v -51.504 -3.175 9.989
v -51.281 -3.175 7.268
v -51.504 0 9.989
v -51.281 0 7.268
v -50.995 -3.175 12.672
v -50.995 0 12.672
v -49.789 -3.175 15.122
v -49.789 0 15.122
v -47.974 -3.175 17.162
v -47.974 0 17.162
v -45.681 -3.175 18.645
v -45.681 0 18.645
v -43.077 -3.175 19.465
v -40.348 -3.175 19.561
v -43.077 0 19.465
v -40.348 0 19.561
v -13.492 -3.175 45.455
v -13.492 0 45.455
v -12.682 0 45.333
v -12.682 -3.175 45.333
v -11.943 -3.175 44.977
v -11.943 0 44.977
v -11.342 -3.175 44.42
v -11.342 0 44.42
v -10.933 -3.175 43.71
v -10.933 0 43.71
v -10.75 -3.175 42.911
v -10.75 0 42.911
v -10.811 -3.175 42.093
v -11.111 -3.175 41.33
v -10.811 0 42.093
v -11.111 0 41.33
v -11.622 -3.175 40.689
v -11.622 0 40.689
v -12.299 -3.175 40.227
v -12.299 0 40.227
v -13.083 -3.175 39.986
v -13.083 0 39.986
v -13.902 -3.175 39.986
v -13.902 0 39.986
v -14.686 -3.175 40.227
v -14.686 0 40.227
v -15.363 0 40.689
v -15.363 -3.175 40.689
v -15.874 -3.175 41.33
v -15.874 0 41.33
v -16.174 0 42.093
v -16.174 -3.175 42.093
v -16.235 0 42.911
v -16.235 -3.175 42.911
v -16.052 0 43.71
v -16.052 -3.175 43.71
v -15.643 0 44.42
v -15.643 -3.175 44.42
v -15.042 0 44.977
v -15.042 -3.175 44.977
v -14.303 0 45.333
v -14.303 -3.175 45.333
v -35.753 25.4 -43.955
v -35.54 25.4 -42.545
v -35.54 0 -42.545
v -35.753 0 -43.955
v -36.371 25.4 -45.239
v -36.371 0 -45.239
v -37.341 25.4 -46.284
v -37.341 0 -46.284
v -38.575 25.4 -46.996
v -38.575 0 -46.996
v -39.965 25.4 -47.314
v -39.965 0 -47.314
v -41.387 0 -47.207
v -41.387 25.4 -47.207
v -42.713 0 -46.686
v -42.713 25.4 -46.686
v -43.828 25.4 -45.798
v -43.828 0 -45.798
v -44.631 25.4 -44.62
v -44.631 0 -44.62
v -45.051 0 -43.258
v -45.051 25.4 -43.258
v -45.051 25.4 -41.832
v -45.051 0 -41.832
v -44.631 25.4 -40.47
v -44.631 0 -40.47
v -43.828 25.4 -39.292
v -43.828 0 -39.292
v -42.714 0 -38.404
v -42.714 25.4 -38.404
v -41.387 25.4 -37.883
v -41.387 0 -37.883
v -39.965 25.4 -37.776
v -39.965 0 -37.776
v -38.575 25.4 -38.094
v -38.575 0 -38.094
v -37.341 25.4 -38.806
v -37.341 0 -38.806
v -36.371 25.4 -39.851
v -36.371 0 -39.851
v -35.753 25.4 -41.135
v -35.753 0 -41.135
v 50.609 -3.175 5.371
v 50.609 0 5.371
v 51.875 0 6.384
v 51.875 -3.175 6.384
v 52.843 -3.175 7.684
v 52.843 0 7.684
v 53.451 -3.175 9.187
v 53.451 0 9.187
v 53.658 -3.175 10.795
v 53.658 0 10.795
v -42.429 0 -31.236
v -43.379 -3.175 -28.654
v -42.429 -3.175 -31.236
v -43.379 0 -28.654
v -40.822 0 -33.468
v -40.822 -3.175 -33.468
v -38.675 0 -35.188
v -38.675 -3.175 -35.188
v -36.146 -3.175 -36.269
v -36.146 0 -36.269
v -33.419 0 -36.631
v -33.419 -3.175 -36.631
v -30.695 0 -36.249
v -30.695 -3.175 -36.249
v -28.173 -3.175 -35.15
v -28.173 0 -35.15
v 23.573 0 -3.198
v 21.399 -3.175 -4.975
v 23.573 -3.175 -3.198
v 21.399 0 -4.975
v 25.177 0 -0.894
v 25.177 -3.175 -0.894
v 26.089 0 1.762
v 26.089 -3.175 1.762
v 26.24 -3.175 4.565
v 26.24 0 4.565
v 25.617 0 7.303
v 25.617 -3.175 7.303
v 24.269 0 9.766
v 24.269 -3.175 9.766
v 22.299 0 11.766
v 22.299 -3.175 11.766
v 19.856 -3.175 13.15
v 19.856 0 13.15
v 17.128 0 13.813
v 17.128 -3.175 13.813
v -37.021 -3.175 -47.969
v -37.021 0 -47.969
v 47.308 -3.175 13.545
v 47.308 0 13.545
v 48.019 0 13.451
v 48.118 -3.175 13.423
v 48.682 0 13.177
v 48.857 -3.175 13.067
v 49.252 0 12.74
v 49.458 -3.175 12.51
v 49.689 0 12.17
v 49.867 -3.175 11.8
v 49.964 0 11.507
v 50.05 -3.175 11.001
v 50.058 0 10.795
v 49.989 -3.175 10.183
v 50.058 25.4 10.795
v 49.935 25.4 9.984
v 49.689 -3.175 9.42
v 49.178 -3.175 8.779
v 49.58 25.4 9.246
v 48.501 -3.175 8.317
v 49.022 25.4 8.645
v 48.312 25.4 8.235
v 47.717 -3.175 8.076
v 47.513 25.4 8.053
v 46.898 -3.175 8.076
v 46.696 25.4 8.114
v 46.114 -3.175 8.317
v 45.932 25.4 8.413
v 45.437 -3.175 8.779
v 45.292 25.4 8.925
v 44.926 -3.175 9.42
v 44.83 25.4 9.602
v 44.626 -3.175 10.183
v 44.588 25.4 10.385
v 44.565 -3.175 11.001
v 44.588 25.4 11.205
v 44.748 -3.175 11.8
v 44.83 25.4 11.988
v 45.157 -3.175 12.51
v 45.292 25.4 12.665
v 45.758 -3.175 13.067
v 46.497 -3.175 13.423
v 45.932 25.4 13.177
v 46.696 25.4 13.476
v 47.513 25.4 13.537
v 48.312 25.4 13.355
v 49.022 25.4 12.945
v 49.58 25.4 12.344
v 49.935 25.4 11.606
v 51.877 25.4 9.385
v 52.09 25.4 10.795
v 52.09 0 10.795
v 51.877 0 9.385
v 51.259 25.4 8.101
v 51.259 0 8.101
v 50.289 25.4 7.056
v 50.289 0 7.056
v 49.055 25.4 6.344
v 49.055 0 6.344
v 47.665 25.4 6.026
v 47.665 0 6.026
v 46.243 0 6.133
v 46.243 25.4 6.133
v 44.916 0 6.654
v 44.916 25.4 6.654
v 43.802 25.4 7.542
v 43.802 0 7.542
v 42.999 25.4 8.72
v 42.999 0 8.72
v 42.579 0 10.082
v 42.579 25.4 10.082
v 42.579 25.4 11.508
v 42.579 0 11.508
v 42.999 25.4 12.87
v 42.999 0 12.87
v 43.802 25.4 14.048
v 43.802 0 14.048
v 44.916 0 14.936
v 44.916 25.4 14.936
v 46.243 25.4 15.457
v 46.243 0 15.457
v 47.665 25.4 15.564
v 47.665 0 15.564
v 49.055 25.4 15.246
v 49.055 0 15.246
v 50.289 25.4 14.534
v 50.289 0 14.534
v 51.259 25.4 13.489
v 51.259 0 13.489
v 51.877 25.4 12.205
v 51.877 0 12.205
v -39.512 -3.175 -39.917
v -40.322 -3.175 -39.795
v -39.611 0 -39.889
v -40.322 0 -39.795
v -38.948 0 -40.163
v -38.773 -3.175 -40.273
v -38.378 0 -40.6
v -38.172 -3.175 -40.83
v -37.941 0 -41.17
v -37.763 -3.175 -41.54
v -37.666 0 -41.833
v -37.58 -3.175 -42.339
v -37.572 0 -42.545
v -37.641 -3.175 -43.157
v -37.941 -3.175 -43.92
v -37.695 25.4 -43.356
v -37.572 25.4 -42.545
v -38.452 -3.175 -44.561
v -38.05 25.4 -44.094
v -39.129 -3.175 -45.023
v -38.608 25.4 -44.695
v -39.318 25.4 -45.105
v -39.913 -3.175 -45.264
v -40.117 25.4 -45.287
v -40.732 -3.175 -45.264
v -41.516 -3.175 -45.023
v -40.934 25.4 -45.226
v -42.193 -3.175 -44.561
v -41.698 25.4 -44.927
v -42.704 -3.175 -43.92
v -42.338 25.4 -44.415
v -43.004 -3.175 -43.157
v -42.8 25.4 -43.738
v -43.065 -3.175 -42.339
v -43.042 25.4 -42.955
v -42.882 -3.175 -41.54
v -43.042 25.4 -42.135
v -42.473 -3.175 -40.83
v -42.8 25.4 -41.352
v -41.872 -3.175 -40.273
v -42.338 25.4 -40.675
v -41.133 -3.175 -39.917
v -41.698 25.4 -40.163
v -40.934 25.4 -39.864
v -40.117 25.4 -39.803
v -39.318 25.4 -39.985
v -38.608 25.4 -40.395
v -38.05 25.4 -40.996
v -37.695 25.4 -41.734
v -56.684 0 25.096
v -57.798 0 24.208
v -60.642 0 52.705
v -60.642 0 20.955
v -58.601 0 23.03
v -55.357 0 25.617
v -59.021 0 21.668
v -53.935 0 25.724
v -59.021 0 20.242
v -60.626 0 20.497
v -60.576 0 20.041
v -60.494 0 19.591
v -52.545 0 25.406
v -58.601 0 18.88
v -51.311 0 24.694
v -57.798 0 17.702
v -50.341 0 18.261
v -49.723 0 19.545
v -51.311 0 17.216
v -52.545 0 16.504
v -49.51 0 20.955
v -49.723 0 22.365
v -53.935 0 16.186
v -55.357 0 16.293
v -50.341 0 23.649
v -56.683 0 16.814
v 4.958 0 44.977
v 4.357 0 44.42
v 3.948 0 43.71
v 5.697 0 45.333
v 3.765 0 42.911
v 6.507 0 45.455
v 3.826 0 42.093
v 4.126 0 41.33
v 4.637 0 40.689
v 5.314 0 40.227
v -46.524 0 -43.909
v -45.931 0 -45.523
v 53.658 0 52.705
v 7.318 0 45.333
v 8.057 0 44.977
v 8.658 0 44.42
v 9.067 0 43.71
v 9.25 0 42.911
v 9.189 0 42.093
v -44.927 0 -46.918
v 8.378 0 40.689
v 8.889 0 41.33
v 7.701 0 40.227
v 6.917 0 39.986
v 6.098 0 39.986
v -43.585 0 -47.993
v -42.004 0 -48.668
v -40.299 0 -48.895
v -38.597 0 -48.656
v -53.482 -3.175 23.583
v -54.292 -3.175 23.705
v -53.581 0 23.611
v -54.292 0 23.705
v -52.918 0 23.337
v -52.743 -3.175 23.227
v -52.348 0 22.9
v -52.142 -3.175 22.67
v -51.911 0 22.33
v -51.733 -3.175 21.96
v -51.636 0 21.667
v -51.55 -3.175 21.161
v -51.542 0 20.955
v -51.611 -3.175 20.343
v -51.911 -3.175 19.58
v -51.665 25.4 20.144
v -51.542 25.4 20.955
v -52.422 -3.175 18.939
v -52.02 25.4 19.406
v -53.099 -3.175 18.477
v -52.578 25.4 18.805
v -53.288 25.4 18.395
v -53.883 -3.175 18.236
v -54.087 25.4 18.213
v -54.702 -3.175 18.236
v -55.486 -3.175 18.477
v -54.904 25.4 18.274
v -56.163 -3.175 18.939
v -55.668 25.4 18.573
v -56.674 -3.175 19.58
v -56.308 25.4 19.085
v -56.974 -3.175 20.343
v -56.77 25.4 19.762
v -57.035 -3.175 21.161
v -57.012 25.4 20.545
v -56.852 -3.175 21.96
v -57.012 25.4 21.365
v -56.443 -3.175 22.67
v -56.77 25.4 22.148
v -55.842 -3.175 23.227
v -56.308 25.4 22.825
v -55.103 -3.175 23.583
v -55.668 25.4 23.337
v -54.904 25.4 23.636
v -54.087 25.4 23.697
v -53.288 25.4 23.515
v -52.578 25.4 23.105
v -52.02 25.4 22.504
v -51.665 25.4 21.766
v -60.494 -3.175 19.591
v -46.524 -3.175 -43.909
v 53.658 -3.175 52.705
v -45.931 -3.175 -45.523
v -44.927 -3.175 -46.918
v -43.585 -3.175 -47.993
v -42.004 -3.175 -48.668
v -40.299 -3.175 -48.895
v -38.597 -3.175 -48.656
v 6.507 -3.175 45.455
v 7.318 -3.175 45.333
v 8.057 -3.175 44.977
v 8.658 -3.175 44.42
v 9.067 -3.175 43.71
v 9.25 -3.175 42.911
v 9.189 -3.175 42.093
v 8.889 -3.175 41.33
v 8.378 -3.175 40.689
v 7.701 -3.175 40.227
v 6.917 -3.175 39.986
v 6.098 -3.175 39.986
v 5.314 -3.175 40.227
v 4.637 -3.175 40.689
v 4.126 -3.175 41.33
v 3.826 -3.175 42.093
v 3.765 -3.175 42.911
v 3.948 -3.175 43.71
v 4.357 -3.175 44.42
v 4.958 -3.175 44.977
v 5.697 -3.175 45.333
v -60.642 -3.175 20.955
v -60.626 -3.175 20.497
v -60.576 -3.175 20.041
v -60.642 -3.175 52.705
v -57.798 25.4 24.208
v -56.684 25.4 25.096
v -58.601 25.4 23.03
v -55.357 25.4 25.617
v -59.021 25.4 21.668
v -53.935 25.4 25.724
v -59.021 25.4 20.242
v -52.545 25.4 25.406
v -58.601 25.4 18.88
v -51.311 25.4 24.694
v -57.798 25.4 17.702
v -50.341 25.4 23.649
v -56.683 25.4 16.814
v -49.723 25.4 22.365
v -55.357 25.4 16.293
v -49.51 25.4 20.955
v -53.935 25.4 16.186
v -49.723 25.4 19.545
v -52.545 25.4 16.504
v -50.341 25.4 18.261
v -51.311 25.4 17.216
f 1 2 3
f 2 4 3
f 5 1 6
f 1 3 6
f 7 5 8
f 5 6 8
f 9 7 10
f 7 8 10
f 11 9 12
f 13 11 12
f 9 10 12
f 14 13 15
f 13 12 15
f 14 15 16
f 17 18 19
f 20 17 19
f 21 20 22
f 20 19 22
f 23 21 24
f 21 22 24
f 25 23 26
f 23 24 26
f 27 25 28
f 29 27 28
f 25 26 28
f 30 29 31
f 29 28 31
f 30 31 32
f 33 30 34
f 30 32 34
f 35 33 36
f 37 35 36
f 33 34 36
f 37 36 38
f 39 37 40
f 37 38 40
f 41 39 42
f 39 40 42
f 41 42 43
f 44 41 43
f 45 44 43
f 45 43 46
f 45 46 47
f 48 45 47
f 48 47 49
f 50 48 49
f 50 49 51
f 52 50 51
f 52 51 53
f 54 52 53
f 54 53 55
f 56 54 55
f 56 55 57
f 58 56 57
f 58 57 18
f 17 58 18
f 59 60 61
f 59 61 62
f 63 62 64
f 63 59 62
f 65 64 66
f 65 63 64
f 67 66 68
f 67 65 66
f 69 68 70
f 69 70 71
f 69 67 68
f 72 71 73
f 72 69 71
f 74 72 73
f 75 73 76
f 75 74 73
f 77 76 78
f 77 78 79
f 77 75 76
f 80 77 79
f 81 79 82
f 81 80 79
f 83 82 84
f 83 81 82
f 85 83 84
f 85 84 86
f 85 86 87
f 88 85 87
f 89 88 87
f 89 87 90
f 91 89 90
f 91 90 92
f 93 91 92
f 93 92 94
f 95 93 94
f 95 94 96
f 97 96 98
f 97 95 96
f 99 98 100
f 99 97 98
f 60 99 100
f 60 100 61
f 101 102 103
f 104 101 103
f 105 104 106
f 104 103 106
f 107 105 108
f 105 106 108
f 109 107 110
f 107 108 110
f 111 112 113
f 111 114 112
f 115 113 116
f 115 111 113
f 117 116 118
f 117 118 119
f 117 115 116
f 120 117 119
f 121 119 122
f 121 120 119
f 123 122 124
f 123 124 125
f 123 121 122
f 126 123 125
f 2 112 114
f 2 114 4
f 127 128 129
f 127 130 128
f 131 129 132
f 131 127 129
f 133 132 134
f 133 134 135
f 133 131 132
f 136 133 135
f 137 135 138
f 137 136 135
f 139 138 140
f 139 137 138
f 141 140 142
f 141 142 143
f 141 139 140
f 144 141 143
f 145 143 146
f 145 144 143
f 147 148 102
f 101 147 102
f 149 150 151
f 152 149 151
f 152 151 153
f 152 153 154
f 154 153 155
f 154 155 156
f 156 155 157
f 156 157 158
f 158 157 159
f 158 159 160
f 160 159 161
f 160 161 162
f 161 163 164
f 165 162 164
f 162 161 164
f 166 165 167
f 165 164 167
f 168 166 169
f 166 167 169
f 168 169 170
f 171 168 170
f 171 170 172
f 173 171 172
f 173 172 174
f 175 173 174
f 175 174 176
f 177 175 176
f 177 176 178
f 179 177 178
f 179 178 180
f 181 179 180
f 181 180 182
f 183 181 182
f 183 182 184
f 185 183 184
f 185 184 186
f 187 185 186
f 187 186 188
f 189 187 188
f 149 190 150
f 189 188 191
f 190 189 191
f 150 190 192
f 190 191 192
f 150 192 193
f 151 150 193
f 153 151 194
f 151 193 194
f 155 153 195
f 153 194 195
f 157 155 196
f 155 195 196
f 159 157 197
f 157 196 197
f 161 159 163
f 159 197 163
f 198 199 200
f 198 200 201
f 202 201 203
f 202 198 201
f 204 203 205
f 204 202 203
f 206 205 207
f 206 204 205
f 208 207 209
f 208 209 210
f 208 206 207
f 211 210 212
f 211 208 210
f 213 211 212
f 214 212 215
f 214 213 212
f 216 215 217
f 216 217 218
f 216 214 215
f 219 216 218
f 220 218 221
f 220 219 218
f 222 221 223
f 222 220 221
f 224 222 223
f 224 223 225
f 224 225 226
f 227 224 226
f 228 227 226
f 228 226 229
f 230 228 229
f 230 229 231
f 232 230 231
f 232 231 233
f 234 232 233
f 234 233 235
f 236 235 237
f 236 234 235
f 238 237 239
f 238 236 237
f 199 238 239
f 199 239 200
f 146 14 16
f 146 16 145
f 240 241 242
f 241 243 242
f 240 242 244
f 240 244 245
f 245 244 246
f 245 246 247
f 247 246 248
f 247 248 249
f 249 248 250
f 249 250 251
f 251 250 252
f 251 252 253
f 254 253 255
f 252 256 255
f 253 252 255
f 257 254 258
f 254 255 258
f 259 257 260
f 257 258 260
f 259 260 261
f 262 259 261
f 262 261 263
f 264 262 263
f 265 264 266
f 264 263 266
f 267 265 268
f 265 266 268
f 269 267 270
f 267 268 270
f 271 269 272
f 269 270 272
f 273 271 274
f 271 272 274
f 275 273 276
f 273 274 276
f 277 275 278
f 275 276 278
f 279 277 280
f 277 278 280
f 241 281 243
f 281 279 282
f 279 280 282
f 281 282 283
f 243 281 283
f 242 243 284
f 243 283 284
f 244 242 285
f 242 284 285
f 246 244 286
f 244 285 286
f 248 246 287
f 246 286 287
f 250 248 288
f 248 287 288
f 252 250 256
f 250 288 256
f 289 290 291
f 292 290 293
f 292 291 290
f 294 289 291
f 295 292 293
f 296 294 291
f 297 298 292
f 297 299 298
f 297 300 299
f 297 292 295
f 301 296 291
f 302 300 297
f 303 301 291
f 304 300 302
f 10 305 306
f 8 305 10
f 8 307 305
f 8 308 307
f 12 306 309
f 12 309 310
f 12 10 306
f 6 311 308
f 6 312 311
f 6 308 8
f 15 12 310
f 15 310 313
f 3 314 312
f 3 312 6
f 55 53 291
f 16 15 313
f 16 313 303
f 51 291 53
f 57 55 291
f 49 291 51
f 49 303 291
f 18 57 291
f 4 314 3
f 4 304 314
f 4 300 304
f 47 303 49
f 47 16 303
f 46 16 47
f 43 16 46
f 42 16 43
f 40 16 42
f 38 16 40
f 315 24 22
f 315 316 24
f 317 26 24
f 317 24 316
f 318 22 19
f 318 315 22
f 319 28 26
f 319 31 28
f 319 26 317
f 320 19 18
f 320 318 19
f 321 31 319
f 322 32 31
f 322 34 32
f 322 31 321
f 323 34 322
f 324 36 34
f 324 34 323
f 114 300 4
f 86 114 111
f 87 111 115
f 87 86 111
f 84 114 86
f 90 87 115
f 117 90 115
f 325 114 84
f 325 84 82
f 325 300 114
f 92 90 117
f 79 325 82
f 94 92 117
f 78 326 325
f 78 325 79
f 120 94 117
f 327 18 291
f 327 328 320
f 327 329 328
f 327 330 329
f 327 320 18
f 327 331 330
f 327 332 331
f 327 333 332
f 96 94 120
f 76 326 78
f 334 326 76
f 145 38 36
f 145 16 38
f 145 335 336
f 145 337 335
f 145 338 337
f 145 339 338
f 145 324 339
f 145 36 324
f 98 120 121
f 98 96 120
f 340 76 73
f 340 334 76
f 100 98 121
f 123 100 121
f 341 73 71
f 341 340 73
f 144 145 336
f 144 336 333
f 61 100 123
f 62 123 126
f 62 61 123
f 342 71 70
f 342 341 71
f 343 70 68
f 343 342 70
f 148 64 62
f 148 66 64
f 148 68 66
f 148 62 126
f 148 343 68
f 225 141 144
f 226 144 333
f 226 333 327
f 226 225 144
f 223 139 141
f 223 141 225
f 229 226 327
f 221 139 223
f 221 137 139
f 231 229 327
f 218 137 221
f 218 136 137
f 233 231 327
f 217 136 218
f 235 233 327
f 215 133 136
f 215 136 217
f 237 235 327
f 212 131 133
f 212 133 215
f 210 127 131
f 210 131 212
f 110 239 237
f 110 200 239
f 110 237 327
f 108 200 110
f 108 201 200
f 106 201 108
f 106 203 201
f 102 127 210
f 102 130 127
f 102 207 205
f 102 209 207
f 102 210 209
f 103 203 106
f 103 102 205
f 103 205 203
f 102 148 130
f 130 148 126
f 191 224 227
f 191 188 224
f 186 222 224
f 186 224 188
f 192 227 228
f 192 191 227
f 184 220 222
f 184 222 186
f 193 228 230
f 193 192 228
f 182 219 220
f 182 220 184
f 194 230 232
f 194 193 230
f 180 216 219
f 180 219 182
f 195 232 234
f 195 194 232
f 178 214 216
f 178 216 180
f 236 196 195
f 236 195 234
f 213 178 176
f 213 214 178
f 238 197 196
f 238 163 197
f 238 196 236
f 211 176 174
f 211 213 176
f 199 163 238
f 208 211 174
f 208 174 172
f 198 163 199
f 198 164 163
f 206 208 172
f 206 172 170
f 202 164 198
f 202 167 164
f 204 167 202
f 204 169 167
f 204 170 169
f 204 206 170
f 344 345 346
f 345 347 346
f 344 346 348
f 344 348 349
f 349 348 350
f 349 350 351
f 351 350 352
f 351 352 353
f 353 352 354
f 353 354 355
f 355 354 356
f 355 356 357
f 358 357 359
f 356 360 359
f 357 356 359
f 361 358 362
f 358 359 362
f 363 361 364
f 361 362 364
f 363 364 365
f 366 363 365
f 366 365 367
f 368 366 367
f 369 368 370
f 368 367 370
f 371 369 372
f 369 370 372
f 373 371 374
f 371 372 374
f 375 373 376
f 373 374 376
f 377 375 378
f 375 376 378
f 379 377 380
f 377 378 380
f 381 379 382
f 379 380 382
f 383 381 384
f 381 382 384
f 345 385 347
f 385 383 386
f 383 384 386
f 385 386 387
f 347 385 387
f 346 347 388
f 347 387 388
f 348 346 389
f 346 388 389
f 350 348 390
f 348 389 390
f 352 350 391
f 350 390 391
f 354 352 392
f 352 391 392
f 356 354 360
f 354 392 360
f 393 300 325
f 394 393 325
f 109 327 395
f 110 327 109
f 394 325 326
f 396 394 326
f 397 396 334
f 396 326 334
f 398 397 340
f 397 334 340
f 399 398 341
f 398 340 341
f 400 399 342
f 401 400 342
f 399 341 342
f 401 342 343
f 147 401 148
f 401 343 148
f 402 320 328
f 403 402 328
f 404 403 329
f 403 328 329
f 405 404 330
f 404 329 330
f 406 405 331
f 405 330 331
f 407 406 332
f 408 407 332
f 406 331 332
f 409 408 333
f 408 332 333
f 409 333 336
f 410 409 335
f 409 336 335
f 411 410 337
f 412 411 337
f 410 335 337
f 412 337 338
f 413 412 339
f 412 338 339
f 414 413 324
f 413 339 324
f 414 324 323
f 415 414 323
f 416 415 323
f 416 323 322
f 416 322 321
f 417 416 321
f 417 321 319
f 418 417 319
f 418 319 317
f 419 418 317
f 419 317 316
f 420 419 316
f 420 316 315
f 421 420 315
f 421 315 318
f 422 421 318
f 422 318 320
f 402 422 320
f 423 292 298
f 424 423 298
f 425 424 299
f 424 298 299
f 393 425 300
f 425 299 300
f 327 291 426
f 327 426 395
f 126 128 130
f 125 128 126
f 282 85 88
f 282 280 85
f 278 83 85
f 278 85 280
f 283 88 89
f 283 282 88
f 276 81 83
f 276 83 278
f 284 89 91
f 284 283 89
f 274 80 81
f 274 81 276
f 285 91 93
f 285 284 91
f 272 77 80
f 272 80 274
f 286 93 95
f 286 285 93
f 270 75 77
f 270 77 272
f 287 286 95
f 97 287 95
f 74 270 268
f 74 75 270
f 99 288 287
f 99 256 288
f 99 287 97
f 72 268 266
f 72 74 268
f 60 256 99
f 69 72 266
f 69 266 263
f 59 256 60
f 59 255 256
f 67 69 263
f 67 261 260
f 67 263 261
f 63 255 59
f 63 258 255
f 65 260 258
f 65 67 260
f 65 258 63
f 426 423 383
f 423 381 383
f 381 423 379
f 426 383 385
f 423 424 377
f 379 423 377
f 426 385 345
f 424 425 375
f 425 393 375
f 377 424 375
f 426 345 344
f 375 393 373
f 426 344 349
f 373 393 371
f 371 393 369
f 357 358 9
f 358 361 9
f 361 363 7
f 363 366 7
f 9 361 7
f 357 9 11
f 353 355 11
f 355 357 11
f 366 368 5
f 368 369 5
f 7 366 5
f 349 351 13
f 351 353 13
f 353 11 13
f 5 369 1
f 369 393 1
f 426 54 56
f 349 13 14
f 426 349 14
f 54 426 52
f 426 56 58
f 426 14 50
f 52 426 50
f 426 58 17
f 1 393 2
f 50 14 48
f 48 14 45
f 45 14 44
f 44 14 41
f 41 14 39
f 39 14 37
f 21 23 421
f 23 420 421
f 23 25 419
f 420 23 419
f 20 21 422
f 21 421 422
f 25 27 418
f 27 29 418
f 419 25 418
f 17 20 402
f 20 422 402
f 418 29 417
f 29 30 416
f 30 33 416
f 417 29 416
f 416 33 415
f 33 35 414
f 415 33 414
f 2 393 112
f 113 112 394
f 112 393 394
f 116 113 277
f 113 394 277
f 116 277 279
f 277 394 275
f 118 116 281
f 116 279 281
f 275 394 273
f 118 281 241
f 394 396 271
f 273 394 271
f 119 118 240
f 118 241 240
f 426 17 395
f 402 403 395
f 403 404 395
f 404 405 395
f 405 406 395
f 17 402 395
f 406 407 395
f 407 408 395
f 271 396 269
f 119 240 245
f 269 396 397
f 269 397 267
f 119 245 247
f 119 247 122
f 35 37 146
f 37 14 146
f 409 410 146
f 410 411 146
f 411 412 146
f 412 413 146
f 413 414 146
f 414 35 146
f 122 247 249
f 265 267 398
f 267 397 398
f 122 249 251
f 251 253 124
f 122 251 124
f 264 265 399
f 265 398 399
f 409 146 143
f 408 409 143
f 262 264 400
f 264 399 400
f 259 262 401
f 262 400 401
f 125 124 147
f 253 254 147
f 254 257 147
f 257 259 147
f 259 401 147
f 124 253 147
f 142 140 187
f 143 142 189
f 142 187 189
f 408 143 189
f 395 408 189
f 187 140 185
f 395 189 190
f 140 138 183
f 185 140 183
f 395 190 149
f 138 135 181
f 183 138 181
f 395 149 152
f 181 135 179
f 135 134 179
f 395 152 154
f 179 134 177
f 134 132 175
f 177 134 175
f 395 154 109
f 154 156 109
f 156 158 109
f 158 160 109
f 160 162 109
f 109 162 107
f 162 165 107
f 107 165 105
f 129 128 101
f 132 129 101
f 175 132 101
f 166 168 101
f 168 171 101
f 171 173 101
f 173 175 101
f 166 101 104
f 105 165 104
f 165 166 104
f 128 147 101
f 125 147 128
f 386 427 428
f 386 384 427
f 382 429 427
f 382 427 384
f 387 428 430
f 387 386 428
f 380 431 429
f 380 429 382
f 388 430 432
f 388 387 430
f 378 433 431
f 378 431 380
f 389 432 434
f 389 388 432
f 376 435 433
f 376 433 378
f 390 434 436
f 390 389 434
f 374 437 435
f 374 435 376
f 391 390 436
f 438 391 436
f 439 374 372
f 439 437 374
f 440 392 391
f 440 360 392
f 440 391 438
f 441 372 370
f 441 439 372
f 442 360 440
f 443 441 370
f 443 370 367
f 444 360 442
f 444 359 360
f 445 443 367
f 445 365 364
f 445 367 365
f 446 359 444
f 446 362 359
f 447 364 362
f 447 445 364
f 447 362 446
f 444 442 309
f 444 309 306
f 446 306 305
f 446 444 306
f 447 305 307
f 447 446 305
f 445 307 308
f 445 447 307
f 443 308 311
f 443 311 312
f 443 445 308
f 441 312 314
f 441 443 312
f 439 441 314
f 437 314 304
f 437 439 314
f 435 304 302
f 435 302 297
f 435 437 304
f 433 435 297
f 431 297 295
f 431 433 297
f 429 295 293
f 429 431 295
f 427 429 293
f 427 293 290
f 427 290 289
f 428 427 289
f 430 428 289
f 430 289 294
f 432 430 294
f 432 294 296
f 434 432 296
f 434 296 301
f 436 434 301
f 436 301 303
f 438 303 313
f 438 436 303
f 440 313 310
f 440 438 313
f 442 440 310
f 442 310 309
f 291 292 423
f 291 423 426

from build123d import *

# Parameters (mm, degrees)
BOSS_EXTRUDE1_DEPTH = 3.175
SHELL1_START        = -3.175
SHELL1_DEPTH        = 3.175
FILLET1_R           = 10.16
BOSS_EXTRUDE2_DEPTH = 3.175
SKETCH1_R           = 2.75
CUT_EXTRUDE1_DEPTH  = 81.407776093
EXTRUDE_THIN1_START = 25.4
SKETCH5_R           = 4.782
SKETCH5_R_2         = 2.75
EXTRUDE_THIN1_DEPTH = 25.4
SKETCH6_R           = 2.749999961
CUT_EXTRUDE2_DEPTH  = 85.264404295


# Read off the part's stored shape, not the designer's step: Shell1
with BuildPart() as part:
    # Sketch2 → Boss-Extrude1 (new body)
    with BuildSketch(Plane(origin=(0, 0, 0), x_dir=(1, 0, 0), z_dir=(0, 1, 0))):
        with BuildLine():
            Line((-60.494192364, -19.59062768), (-46.524192364, 43.90937232))
            ThreePointArc((-46.524192364, 43.90937232), (-42.81709678, 48.384476595), (-37.020836887, 47.969160828))
            Line((-37.020836887, 47.969160828), (50.609163113, -5.370839172))
            ThreePointArc((50.609163113, -5.370839172), (53.499476113, -12.202811), (47.939348616, -17.113486158))
            Line((47.939348616, -17.113486158), (-53.660651384, -27.273486158))
            ThreePointArc((-53.660651384, -27.273486158), (-59.037220059, -25.175205156), (-60.494192364, -19.59062768))
        make_face()
    extrude(amount=-BOSS_EXTRUDE1_DEPTH)

    # Shell1 outline → Shell1 (cut)
    with BuildSketch(Plane(origin=(0, 0, 0), x_dir=(1, 0, 0), z_dir=(0, 1, 0)).offset(SHELL1_START)):
        Polygon((-54.2925, -20.955), (47.3075, -10.795), (-40.3225, 42.545), align=None)
    extrude(amount=SHELL1_DEPTH, mode=Mode.SUBTRACT)

    # Fillet1
    fillet1_edges = [part.edges().sort_by_distance(p)[0] for p in [
        (-40.3225, -1.5875, -42.545),
        (47.3075, -1.5875, 10.795),
        (-54.2925, -1.5875, 20.955),
    ]]
    fillet(fillet1_edges, radius=FILLET1_R)

    # Sketch3 → Boss-Extrude2 (add)
    with BuildSketch(Plane(origin=(0, 0, 0), x_dir=(1, 0, 0), z_dir=(0, 1, 0))):
        with BuildLine():
            Line((-60.6425, -20.955), (-60.6425, -52.705))
            Line((-60.6425, -52.705), (53.6575, -52.705))
            Line((53.6575, -52.705), (53.6575, -10.795))
            ThreePointArc((53.6575, -10.795), (52.015723588, -15.055883787), (47.939348616, -17.113486158))
            Line((47.939348616, -17.113486158), (-53.660651384, -27.273486158))
            ThreePointArc((-53.660651384, -27.273486158), (-58.553383787, -25.663223588), (-60.6425, -20.955))
        make_face()
    extrude(amount=-BOSS_EXTRUDE2_DEPTH)

    # Sketch1 → Cut-Extrude1 (cut, through all)
    with BuildSketch(Plane(origin=(0, 0, 0), x_dir=(1, 0, 0), z_dir=(0, 1, 0))):
        with Locations(Location((-54.2925, -20.955, 0), (0, 0, 270))):
            Circle(SKETCH1_R)
        with Locations(Location((47.3075, -10.795, 0), (0, 0, 270))):
            Circle(SKETCH1_R)
        with Locations(Location((-40.3225, 42.545, 0), (0, 0, 270))):
            Circle(SKETCH1_R)
    extrude(amount=-CUT_EXTRUDE1_DEPTH, mode=Mode.SUBTRACT)

    # Sketch5 → Extrude-Thin1 (add)
    # profile 1 of 3: a face of its own
    with BuildSketch(Plane(origin=(0, 0, 0), x_dir=(1, 0, 0), z_dir=(0, 1, 0)).offset(EXTRUDE_THIN1_START)):
        with Locations((47.3075, -10.795)):
            Circle(SKETCH5_R)
        with Locations((47.3075, -10.795)):
            Circle(SKETCH5_R_2, mode=Mode.SUBTRACT)
    # profile 2 of 3: a face of its own
    with BuildSketch(Plane(origin=(0, 0, 0), x_dir=(1, 0, 0), z_dir=(0, 1, 0)).offset(EXTRUDE_THIN1_START)):
        with Locations((-54.2925, -20.955)):
            Circle(SKETCH5_R)
        with Locations((-54.2925, -20.955)):
            Circle(SKETCH5_R_2, mode=Mode.SUBTRACT)
    # profile 3 of 3: a face of its own
    with BuildSketch(Plane(origin=(0, 0, 0), x_dir=(1, 0, 0), z_dir=(0, 1, 0)).offset(EXTRUDE_THIN1_START)):
        with Locations((-40.3225, 42.545)):
            Circle(SKETCH5_R)
        with Locations((-40.3225, 42.545)):
            Circle(SKETCH5_R_2, mode=Mode.SUBTRACT)
    extrude(amount=-EXTRUDE_THIN1_DEPTH)

    # Sketch6 → Cut-Extrude2 (cut, through all)
    with BuildSketch(Plane(origin=(0, 0, 0), x_dir=(1, 0, 0), z_dir=(0, 1, 0))):
        with Locations(Location((-13.492499939, -42.705, 0), (0, 0, 270))):
            Circle(SKETCH6_R)
        with Locations(Location((6.507499939, -42.705, 0), (0, 0, 270))):
            Circle(SKETCH6_R)
    extrude(amount=-CUT_EXTRUDE2_DEPTH, mode=Mode.SUBTRACT)


solid = part.part
